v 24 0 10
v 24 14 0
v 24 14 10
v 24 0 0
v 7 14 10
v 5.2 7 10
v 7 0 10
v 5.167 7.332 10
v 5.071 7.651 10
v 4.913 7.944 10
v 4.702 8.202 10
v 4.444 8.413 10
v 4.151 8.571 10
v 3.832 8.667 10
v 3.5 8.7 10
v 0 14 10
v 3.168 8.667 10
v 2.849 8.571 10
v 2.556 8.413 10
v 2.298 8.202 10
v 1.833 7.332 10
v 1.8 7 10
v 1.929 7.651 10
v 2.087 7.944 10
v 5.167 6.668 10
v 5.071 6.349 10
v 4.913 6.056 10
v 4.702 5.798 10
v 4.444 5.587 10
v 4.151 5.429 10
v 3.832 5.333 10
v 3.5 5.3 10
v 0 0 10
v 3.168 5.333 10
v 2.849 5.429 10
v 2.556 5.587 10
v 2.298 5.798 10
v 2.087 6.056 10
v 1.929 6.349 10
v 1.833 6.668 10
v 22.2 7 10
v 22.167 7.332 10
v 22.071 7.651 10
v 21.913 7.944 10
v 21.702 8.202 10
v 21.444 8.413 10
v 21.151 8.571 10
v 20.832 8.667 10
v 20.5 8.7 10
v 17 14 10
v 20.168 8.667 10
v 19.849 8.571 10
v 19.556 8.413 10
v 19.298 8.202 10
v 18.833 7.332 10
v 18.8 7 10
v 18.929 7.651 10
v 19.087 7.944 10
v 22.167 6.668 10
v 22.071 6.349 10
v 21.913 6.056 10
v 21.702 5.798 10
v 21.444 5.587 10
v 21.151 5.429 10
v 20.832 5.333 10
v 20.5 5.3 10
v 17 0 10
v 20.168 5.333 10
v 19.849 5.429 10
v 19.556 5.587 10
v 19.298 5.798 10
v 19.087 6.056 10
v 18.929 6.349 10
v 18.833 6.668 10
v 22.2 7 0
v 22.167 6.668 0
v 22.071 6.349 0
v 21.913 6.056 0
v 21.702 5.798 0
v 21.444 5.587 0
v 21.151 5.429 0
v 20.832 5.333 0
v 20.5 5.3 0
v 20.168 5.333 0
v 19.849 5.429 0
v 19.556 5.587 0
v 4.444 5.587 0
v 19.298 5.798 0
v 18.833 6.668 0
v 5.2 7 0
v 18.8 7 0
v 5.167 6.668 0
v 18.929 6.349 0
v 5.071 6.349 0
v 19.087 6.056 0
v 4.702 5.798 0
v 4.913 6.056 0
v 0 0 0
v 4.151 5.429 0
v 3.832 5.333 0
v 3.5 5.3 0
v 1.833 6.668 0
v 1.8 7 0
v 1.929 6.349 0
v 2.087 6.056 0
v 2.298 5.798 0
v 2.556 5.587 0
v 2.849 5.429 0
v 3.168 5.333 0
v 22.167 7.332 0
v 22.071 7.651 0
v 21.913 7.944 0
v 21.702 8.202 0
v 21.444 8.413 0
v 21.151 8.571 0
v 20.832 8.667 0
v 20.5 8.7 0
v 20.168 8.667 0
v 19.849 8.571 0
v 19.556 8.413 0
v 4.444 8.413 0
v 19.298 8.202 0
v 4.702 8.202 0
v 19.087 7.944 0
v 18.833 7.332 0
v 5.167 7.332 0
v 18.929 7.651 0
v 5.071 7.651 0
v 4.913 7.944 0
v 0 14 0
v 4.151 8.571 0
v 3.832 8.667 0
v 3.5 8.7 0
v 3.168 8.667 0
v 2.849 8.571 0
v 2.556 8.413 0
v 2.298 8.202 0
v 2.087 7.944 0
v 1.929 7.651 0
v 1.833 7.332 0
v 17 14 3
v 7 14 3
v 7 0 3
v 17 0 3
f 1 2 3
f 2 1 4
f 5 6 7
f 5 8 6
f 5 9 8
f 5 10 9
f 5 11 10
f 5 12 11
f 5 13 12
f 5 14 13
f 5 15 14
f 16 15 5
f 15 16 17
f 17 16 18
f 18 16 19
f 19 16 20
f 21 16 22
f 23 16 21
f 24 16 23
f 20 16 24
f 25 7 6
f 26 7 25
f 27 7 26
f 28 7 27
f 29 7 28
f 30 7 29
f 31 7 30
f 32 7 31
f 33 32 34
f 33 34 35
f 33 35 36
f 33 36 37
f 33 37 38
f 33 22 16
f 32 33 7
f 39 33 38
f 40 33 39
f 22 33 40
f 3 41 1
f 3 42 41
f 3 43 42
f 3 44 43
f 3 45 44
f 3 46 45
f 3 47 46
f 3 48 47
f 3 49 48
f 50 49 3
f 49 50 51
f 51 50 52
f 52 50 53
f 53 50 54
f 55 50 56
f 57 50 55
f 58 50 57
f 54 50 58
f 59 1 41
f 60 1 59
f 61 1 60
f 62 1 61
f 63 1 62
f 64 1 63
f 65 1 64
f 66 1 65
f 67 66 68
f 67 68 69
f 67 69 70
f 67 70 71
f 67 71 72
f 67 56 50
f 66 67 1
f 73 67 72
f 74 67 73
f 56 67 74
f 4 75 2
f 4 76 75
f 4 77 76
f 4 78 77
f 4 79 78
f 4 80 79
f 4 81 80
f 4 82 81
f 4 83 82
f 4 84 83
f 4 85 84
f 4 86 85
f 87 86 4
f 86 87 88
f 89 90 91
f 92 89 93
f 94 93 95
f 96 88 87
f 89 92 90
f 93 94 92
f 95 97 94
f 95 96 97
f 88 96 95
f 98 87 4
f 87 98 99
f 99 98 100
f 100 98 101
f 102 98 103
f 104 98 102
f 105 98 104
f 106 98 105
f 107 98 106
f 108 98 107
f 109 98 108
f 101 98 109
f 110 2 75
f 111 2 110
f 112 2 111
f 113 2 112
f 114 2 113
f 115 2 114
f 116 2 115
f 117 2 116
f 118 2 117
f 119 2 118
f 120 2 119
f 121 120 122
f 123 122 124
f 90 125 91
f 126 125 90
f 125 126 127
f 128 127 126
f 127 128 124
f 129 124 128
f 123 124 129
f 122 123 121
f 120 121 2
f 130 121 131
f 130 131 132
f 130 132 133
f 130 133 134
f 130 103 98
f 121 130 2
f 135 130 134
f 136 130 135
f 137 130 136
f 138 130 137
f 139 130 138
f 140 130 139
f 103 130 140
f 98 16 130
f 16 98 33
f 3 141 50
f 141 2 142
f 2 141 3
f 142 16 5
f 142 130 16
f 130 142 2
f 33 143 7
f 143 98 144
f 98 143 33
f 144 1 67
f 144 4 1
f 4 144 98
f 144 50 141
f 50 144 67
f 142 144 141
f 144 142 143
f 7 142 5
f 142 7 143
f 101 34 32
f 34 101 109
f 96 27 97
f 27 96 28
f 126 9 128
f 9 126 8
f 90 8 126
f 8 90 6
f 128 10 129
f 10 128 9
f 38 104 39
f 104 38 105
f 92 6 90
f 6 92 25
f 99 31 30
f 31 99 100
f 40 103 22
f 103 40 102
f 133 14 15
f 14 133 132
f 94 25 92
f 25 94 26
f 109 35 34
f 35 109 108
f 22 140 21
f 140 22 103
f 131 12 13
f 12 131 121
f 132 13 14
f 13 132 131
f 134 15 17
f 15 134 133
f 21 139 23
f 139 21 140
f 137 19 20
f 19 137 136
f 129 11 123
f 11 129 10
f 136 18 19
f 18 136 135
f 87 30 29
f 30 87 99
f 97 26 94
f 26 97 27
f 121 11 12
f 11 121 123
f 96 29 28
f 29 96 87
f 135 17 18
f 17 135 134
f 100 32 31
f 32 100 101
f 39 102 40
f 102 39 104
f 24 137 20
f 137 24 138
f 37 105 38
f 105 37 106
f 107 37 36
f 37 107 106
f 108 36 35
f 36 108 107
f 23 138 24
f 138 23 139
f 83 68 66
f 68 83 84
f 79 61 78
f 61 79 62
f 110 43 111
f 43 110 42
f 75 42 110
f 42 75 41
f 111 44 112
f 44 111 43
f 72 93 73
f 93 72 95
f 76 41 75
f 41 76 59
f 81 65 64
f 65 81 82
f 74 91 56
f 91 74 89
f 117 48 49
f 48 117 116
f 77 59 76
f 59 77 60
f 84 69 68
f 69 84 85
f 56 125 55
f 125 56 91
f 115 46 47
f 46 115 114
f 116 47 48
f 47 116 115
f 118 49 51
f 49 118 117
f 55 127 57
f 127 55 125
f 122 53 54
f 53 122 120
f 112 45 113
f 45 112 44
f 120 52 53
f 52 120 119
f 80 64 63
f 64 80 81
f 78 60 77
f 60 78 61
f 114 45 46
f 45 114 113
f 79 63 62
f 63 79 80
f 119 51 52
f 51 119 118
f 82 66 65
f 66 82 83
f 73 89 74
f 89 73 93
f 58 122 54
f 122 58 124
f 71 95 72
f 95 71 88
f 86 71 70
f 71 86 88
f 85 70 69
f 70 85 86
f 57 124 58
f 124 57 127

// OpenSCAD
// ModuDeck donor chassis study: NOT a verified ThinkPad fit.
// Millimetres. 370x240 is an unconfirmed owner measurement.
$fn=32; W=370; D=240; t=3;
module plate(w,d,h){cube([w,d,h]);}
module shell(w,d,h){difference(){cube([w,d,h]);translate([t,t,t])cube([w-2*t,d-2*t,h]);}}
module hole(x,y,h){translate([x,y,-1])cylinder(d=3.4,h=h+2);}
module rail(n){difference(){cube([n,12,6]);for(x=[10:20:n-10])hole(x,6,6);}}
module rear(){difference(){cube([W-6,3,25]);translate([W/2-23,-1,6])cube([40,5,14]);for(x=[10,W-16])translate([x,-1,12])rotate([-90,0,0])cylinder(d=3.4,h=5);}}
module tray(){difference(){shell(W,D,30);translate([3,D-4,3])cube([W-6,6,27]);for(x=[15,W-15],y=[15,D-15])hole(x,y,30);}}
difference(){cube([24,14,10]);translate([7,-1,3])cube([10,16,8]);hole(3.5,7,10);hole(20.5,7,10);}
